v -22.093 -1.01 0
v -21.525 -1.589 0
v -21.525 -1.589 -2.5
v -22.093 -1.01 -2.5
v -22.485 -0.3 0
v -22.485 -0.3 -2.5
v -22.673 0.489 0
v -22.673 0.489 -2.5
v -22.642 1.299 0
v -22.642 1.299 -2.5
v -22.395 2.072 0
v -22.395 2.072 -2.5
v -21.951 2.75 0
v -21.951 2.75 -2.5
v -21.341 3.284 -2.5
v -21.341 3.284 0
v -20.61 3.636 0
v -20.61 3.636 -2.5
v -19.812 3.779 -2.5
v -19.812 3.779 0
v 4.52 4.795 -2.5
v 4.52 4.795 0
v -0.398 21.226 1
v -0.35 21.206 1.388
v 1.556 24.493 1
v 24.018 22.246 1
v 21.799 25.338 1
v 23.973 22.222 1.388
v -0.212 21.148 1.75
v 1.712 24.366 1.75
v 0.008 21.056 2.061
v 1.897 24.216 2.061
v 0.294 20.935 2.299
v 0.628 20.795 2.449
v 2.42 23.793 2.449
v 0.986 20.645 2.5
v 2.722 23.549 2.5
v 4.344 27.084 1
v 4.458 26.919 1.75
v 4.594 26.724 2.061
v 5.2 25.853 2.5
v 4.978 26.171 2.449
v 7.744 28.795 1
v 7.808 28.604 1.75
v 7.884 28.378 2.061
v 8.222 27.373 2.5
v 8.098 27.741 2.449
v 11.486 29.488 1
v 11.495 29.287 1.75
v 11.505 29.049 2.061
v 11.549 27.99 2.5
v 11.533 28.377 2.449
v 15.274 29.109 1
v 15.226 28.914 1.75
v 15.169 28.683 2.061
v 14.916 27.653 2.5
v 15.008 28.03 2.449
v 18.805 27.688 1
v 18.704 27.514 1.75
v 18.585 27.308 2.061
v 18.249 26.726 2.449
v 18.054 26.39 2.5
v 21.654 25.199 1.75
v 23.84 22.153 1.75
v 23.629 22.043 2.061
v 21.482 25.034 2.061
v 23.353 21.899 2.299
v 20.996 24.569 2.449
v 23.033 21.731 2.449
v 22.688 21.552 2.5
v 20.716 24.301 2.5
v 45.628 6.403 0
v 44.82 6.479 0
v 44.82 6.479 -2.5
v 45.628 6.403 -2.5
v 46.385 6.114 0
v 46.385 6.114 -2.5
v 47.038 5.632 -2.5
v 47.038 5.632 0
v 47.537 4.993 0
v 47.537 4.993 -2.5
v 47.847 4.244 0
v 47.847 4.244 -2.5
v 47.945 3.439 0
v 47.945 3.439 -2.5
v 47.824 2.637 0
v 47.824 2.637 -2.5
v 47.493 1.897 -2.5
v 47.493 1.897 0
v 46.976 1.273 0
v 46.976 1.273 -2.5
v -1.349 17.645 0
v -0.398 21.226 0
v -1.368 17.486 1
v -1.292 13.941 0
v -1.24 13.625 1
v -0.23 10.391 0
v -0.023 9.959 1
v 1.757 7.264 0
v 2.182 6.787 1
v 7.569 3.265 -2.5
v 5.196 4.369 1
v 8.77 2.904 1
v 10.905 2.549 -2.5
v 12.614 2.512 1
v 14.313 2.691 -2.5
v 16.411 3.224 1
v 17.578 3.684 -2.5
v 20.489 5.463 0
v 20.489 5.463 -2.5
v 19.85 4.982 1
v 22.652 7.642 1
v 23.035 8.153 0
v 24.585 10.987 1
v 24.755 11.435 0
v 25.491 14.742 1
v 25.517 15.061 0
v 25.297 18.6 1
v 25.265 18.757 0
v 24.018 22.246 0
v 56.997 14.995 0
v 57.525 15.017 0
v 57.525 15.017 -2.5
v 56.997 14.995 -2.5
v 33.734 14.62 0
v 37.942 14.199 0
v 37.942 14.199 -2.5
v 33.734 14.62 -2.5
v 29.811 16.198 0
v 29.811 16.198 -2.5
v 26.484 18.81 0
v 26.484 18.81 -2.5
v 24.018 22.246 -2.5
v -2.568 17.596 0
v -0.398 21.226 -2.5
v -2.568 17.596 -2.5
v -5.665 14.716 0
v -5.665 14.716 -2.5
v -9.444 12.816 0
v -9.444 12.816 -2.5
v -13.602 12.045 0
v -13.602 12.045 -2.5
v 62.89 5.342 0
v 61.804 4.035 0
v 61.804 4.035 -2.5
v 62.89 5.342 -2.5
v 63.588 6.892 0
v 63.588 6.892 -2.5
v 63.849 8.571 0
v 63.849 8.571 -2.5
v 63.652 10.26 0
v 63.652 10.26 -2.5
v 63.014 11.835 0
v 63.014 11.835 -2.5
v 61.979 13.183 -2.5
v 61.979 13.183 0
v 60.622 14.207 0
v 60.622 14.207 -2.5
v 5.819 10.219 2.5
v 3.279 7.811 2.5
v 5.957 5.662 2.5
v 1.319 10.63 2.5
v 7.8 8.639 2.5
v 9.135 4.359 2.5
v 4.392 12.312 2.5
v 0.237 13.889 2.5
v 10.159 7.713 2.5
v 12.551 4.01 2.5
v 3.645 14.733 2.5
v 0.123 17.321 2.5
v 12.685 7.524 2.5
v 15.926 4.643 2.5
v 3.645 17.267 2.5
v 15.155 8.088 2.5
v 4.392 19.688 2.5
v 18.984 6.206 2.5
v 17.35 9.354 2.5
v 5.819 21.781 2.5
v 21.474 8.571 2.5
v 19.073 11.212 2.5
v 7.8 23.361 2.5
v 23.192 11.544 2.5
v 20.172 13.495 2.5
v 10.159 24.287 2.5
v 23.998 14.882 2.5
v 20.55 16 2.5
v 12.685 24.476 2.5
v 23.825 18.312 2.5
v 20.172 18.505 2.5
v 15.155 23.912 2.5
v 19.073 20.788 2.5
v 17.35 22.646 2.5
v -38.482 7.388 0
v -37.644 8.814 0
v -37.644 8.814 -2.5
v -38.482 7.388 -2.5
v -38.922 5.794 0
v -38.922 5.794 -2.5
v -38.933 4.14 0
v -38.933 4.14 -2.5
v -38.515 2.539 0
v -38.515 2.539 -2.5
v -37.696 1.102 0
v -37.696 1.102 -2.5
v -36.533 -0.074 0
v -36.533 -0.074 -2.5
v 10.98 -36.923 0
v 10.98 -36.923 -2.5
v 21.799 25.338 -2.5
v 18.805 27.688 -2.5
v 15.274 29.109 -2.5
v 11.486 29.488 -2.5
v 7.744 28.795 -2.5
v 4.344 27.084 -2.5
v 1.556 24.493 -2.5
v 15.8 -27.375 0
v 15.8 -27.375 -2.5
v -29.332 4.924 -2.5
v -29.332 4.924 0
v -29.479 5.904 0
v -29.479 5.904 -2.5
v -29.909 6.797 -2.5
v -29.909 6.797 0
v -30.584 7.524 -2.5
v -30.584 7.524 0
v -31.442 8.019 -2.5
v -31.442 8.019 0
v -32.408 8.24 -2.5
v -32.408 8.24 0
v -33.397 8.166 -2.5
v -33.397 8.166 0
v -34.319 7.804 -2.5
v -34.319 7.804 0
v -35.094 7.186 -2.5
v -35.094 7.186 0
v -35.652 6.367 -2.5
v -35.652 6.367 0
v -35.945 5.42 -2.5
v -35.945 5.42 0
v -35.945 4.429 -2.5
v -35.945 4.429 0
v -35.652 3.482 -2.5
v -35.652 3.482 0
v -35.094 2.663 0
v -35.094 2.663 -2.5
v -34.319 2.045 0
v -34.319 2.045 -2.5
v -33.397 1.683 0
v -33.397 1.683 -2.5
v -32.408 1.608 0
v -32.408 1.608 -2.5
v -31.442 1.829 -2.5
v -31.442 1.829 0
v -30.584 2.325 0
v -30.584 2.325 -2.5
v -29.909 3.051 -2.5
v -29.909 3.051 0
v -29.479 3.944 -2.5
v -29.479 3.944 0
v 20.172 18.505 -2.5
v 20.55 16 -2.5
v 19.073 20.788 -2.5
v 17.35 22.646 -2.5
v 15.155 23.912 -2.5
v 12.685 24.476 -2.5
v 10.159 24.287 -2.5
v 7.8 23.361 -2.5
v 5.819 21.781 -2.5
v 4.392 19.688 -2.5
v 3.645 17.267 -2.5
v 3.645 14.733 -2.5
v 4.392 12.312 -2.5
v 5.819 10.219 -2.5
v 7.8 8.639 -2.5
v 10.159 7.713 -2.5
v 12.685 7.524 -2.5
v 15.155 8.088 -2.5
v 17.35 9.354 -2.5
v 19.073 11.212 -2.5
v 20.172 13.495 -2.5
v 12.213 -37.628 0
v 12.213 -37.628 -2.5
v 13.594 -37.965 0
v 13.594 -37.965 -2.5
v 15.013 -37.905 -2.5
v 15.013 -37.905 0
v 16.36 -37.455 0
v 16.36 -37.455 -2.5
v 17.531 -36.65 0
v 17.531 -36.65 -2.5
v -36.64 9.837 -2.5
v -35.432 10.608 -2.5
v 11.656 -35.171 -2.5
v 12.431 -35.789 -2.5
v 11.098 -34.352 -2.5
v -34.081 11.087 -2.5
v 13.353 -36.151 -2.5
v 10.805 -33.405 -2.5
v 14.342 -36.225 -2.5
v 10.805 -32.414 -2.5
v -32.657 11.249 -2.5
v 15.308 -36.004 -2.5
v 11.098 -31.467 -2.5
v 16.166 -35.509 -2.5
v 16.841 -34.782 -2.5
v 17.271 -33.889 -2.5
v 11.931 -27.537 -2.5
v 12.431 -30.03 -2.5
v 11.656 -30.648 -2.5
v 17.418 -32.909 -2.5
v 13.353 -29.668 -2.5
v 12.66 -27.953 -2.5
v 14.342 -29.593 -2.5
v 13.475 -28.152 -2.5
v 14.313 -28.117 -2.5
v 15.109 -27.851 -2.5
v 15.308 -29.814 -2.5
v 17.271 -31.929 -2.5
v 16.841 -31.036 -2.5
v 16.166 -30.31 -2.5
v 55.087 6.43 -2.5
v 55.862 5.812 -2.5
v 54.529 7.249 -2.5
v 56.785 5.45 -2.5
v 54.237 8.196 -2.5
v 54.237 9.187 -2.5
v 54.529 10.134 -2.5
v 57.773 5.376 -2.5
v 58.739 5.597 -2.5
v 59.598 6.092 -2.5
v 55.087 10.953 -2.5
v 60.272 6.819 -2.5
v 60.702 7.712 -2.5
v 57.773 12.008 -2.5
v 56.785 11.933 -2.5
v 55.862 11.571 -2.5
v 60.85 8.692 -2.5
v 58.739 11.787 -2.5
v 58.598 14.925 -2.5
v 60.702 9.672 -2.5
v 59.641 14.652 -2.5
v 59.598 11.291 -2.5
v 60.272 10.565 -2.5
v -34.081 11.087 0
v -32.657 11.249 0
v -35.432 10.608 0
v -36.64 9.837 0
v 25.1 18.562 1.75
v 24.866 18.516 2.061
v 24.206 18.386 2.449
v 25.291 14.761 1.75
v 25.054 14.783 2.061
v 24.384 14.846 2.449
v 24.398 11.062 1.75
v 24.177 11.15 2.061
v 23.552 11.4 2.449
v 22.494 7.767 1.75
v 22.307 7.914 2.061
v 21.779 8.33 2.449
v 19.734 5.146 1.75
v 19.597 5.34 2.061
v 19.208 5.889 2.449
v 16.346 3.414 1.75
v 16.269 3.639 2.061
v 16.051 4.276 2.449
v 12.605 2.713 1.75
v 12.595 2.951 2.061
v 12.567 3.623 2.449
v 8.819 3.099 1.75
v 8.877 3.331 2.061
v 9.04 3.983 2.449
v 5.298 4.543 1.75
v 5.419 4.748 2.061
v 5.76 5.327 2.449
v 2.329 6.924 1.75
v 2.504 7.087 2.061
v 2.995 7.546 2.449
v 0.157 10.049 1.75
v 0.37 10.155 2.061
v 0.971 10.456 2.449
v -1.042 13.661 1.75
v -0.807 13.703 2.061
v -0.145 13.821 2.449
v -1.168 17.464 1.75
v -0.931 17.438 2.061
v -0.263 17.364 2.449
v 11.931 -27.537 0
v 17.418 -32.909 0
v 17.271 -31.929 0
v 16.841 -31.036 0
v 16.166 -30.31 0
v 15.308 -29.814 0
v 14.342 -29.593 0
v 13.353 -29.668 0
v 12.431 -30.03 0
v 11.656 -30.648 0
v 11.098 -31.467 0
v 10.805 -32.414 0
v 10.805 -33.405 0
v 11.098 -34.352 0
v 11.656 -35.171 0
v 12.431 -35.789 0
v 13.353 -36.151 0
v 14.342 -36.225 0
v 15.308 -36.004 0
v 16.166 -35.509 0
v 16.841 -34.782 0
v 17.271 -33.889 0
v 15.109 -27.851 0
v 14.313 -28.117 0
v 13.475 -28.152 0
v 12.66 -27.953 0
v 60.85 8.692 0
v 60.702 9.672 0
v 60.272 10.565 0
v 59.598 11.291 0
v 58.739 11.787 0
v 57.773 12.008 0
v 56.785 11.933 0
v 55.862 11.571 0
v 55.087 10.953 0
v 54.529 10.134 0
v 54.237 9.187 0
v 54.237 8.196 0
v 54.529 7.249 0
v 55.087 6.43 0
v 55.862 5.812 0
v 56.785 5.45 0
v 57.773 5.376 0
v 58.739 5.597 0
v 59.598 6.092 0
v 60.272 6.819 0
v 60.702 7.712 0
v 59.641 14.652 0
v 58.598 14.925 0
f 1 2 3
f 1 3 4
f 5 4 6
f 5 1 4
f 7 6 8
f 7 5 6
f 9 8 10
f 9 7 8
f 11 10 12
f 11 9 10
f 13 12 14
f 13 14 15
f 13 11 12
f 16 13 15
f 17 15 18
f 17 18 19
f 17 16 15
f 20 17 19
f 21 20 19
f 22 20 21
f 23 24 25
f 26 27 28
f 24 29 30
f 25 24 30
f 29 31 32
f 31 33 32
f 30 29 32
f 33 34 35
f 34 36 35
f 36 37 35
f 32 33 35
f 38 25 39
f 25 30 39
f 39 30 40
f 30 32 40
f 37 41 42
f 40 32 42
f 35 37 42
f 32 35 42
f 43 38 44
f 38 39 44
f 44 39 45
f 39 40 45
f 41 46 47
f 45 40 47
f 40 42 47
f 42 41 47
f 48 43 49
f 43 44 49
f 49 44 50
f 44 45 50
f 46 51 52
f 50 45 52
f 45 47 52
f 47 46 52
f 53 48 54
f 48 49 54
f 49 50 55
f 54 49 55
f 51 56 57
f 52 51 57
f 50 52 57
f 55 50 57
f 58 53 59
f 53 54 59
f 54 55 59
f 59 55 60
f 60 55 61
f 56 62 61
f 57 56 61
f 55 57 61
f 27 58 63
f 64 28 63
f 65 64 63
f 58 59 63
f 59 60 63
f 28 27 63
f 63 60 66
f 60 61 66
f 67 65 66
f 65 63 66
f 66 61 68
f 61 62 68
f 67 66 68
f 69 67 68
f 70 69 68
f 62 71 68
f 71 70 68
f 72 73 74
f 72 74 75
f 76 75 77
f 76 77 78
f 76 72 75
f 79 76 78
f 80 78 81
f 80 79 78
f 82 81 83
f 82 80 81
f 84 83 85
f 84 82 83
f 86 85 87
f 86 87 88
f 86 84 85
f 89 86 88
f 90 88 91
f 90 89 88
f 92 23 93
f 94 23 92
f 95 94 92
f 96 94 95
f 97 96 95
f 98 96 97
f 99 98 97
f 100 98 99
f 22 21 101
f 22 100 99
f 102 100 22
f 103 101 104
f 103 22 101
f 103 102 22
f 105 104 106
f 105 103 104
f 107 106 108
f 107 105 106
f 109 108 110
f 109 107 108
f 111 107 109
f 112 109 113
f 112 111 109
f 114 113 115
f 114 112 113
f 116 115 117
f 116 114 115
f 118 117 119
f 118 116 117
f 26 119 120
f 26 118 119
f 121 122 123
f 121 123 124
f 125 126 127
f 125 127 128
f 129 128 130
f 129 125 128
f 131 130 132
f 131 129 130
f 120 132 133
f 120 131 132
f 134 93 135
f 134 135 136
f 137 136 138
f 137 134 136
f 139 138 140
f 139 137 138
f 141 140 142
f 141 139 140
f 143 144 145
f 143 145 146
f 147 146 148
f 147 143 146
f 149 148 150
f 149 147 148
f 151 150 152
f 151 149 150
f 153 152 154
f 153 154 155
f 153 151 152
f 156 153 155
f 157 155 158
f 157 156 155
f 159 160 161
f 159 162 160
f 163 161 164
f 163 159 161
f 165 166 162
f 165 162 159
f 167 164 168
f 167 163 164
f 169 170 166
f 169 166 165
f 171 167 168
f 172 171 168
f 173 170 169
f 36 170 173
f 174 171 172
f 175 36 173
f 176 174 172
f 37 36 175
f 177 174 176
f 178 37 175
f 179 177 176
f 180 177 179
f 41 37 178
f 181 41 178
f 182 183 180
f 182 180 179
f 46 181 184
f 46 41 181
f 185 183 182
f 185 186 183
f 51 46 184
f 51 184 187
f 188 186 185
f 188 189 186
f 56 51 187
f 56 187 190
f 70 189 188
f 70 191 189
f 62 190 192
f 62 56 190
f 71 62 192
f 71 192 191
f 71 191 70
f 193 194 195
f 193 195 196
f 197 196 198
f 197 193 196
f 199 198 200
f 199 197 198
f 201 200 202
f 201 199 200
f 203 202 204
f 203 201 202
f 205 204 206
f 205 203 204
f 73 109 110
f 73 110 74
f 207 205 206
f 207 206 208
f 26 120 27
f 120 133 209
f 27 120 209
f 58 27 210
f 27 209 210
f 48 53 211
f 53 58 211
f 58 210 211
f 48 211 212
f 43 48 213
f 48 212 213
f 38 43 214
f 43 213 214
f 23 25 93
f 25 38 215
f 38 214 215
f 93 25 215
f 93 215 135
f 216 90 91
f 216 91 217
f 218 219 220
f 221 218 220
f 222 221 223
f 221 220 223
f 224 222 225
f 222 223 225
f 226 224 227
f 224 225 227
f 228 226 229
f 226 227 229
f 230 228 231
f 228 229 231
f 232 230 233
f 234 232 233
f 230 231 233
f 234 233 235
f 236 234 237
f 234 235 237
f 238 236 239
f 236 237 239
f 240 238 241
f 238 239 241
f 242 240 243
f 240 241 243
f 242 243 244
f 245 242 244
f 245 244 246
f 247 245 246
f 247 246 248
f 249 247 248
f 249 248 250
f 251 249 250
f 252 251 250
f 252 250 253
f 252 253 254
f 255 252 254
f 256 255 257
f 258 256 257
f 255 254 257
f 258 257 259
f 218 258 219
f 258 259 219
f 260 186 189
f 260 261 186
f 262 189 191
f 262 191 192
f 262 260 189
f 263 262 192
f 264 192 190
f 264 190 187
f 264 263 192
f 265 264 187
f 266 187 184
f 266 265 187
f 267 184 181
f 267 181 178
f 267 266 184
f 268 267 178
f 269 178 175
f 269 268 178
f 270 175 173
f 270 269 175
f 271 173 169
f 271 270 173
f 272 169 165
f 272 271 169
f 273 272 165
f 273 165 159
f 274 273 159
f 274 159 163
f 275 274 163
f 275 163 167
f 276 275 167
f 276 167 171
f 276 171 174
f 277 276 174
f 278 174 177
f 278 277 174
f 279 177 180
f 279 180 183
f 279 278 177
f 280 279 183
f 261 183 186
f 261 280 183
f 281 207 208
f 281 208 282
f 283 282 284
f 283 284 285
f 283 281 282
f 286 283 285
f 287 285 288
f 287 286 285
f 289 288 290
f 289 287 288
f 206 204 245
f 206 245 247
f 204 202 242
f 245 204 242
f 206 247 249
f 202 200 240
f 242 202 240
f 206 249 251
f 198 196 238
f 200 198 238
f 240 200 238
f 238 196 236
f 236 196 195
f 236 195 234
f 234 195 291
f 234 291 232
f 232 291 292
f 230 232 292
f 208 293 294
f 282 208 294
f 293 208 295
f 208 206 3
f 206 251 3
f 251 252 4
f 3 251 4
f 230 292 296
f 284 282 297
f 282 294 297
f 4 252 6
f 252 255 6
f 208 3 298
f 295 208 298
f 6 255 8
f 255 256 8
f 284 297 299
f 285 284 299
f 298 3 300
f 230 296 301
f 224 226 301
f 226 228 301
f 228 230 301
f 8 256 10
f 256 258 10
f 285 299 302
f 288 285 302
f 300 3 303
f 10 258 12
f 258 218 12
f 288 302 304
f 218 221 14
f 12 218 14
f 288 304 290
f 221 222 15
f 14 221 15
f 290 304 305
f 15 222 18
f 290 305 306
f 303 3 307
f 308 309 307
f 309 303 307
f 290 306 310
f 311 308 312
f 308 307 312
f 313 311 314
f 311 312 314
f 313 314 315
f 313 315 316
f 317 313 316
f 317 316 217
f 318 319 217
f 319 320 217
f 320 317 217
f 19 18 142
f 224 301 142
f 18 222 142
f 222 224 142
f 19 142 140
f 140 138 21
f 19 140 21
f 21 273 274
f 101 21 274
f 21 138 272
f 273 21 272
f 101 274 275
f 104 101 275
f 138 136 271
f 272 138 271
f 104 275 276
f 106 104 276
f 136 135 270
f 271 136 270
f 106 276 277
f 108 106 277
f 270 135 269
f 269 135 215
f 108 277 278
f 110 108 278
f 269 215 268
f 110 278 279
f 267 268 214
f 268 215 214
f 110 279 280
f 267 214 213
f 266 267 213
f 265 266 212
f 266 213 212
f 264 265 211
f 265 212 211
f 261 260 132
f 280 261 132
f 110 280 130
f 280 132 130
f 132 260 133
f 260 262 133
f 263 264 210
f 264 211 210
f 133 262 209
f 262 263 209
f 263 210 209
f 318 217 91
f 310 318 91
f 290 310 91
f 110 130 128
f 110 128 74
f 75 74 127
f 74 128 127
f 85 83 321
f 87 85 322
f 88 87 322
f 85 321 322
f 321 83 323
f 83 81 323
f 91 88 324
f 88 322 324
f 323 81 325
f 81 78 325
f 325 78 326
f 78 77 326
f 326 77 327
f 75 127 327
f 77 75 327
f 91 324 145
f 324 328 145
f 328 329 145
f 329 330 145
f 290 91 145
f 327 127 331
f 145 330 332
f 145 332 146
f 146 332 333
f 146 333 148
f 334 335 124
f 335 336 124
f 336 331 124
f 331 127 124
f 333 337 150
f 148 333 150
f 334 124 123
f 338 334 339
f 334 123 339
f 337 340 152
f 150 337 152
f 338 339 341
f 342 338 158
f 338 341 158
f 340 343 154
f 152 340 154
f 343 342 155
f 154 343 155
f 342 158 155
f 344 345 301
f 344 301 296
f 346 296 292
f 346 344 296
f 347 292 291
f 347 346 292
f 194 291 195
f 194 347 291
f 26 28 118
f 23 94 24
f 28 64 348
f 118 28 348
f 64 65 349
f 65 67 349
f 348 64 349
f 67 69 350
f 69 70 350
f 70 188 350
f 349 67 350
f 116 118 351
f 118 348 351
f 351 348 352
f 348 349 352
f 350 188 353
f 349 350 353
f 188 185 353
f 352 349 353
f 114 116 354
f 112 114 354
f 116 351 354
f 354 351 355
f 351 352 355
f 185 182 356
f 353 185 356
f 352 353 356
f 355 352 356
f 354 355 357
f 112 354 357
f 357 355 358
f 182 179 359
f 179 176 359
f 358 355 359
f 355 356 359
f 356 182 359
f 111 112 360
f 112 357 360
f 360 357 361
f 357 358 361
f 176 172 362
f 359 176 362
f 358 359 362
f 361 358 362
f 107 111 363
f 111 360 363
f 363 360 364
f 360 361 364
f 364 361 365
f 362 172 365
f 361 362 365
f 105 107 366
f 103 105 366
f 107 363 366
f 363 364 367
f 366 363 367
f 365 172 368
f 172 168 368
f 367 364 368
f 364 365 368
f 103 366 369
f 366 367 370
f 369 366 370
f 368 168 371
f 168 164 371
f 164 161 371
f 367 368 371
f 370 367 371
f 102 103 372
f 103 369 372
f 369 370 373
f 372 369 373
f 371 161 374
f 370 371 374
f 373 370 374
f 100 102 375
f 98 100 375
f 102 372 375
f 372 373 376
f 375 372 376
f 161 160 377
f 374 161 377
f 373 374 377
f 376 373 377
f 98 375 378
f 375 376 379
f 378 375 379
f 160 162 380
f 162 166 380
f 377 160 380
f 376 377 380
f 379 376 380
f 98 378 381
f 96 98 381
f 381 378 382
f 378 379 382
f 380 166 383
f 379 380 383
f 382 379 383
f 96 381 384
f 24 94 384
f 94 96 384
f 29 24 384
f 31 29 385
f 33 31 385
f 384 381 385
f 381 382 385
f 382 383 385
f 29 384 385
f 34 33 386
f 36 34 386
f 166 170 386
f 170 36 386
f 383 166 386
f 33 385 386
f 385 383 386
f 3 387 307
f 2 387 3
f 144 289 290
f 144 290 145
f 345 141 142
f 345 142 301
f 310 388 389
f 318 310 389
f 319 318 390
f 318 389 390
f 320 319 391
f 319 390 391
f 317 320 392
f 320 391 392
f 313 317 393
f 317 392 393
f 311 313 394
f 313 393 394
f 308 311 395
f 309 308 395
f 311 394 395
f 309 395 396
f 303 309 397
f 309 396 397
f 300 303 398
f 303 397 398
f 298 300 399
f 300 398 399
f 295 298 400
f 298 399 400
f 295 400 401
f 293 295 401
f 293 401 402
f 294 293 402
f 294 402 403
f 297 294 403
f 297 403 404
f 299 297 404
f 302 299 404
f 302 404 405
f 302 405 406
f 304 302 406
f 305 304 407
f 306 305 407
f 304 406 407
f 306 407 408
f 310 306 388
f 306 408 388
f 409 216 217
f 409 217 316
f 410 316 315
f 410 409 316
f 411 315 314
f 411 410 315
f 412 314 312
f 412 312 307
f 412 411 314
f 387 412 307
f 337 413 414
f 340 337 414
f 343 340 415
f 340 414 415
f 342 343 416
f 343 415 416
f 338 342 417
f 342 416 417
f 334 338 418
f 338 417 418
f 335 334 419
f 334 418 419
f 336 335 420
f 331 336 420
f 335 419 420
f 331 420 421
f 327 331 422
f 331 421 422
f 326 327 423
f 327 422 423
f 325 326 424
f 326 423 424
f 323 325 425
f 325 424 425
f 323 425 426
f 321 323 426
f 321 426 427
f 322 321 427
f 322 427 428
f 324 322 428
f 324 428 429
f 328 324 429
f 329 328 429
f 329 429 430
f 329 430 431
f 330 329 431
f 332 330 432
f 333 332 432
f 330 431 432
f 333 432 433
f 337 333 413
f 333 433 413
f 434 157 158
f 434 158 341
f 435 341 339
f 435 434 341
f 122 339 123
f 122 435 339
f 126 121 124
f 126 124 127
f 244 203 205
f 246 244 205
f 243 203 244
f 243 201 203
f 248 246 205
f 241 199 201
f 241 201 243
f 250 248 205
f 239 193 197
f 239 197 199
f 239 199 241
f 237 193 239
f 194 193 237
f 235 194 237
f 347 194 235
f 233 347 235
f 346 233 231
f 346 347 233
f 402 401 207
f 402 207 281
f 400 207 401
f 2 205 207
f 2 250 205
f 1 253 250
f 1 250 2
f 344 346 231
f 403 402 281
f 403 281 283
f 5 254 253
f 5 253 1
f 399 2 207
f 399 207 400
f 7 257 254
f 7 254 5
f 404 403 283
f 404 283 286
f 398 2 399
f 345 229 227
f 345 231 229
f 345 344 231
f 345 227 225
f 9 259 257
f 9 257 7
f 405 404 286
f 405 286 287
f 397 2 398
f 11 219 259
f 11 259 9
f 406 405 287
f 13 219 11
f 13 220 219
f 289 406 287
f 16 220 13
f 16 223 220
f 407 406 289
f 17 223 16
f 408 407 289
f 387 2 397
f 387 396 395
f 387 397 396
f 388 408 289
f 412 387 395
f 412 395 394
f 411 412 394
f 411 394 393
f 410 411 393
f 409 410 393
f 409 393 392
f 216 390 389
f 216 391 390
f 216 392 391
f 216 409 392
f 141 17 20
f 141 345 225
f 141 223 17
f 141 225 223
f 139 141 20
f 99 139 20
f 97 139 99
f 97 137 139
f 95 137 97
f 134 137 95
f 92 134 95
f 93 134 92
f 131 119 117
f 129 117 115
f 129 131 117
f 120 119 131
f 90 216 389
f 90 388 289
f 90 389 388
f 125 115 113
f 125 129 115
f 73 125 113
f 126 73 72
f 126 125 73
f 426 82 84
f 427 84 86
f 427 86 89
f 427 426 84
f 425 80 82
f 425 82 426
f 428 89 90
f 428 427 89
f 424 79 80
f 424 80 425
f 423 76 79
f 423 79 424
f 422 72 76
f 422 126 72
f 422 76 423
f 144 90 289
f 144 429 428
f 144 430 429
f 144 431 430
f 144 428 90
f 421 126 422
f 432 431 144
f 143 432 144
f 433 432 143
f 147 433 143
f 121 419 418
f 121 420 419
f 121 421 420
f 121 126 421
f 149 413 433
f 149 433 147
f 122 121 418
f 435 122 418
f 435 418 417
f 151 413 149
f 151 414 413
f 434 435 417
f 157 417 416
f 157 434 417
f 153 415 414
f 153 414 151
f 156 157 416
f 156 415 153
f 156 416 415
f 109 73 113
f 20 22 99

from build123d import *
from build123d.topology import SkipClean

# Parameters (mm, degrees)
SKETCH1_R           = 3.325
SKETCH1_R_2         = 8.5
BOSS_EXTRUDE1_DEPTH = 2.5
SKETCH2_R           = 70.911866835
SKETCH2_R_2         = 13.5
CUT_EXTRUDE1_DEPTH  = 2.5
SKETCH3_R           = 13.5
SKETCH3_R_2         = 8.5
BOSS_EXTRUDE2_DEPTH = 5
FILLET1_R           = 1.5


with BuildPart() as part:
    # Sketch1 → Boss-Extrude1 (new, symmetric)
    with BuildSketch(Plane.XY):
        with BuildLine():
            ThreePointArc((60.622067271, 14.206532436), (59.125498335, 14.810906809), (57.524692071, 15.016834632))
            Line((57.524692071, 15.016834632), (56.997116089, 14.994793348))
            Line((56.997116089, 14.994793348), (37.942484943, 14.198721238))
            ThreePointArc((37.942484943, 14.198721238), (29.810784304, 16.198484397), (24.018273447, 22.245833067))
            ThreePointArc((24.018273447, 22.245833067), (11.4864831, 29.488233713), (-0.397539124, 21.225779345))
            ThreePointArc((-0.397539124, 21.225779345), (-5.665447564, 14.71634399), (-13.602008261, 12.045274491))
            Line((-13.602008261, 12.045274491), (-32.656639407, 11.249202381))
            ThreePointArc((-32.656639407, 11.249202381), (-35.431571333, 10.60798438), (-37.643867273, 8.81434161))
            ThreePointArc((-37.643867273, 8.81434161), (-38.932803958, 4.139738531), (-36.53293032, -0.073796594))
            Line((-36.53293032, -0.073796594), (10.980057512, -36.923376572))
            ThreePointArc((10.980057512, -36.923376572), (14.305396611, -37.984745832), (17.530617501, -36.649704619))
            Line((17.530617501, -36.649704619), (61.804364137, 4.034578786))
            ThreePointArc((61.804364137, 4.034578786), (63.807395856, 9.422079897), (60.622067271, 14.206532436))
        make_face()
        with Locations((14.093347289, -32.909173442)):
            Circle(SKETCH1_R, mode=Mode.SUBTRACT)
        with BuildLine():
            Line((-19.81205116, 3.778850103), (44.820399723, 6.479090855))
            ThreePointArc((44.820399723, 6.479090855), (47.71753436, 4.629103679), (46.975509685, 1.272730481))
            Line((46.975509685, 1.272730481), (15.799754589, -27.375471944))
            ThreePointArc((15.799754589, -27.375471944), (13.895096583, -28.163882109), (11.93131365, -27.537089238))
            Line((11.93131365, -27.537089238), (-21.525382137, -1.589127566))
            ThreePointArc((-21.525382137, -1.589127566), (-22.544780206, 1.693656197), (-19.81205116, 3.778850103))
        make_face(mode=Mode.SUBTRACT)
        with Locations((-32.656639407, 4.924202381)):
            Circle(SKETCH1_R, mode=Mode.SUBTRACT)
        with Locations((12.05, 16)):
            Circle(SKETCH1_R_2, mode=Mode.SUBTRACT)
        with Locations((57.524692071, 8.691834632)):
            Circle(SKETCH1_R, mode=Mode.SUBTRACT)
    extrude(amount=BOSS_EXTRUDE1_DEPTH, both=True)

    # Sketch2 → Cut-Extrude1 (cut)
    with SkipClean():  # the faces are left unmerged after this step: merging them gives an invalid solid
        with BuildSketch(Plane.XY.offset(2.5)):
            with Locations((12.05, 16)):
                Circle(SKETCH2_R)
            with Locations((12.05, 16)):
                Circle(SKETCH2_R_2, mode=Mode.SUBTRACT)
        extrude(amount=-CUT_EXTRUDE1_DEPTH, mode=Mode.SUBTRACT)

    # Sketch3 → Boss-Extrude2 (add)
    with BuildSketch(Plane.XY.offset(2.5)):
        with Locations(Location((12.05, 16, 0), (0, 0, 157.226152371))):
            Circle(SKETCH3_R)
        with Locations((12.05, 16)):
            Circle(SKETCH3_R_2, mode=Mode.SUBTRACT)
    extrude(amount=-BOSS_EXTRUDE2_DEPTH)

    # Fillet1
    fillet1_edges = [part.edges().sort_by_distance(p)[0] for p in [
        (25.161477635, 19.215455525, 2.5),
    ]]
    fillet(fillet1_edges, radius=FILLET1_R)


solid = part.part
